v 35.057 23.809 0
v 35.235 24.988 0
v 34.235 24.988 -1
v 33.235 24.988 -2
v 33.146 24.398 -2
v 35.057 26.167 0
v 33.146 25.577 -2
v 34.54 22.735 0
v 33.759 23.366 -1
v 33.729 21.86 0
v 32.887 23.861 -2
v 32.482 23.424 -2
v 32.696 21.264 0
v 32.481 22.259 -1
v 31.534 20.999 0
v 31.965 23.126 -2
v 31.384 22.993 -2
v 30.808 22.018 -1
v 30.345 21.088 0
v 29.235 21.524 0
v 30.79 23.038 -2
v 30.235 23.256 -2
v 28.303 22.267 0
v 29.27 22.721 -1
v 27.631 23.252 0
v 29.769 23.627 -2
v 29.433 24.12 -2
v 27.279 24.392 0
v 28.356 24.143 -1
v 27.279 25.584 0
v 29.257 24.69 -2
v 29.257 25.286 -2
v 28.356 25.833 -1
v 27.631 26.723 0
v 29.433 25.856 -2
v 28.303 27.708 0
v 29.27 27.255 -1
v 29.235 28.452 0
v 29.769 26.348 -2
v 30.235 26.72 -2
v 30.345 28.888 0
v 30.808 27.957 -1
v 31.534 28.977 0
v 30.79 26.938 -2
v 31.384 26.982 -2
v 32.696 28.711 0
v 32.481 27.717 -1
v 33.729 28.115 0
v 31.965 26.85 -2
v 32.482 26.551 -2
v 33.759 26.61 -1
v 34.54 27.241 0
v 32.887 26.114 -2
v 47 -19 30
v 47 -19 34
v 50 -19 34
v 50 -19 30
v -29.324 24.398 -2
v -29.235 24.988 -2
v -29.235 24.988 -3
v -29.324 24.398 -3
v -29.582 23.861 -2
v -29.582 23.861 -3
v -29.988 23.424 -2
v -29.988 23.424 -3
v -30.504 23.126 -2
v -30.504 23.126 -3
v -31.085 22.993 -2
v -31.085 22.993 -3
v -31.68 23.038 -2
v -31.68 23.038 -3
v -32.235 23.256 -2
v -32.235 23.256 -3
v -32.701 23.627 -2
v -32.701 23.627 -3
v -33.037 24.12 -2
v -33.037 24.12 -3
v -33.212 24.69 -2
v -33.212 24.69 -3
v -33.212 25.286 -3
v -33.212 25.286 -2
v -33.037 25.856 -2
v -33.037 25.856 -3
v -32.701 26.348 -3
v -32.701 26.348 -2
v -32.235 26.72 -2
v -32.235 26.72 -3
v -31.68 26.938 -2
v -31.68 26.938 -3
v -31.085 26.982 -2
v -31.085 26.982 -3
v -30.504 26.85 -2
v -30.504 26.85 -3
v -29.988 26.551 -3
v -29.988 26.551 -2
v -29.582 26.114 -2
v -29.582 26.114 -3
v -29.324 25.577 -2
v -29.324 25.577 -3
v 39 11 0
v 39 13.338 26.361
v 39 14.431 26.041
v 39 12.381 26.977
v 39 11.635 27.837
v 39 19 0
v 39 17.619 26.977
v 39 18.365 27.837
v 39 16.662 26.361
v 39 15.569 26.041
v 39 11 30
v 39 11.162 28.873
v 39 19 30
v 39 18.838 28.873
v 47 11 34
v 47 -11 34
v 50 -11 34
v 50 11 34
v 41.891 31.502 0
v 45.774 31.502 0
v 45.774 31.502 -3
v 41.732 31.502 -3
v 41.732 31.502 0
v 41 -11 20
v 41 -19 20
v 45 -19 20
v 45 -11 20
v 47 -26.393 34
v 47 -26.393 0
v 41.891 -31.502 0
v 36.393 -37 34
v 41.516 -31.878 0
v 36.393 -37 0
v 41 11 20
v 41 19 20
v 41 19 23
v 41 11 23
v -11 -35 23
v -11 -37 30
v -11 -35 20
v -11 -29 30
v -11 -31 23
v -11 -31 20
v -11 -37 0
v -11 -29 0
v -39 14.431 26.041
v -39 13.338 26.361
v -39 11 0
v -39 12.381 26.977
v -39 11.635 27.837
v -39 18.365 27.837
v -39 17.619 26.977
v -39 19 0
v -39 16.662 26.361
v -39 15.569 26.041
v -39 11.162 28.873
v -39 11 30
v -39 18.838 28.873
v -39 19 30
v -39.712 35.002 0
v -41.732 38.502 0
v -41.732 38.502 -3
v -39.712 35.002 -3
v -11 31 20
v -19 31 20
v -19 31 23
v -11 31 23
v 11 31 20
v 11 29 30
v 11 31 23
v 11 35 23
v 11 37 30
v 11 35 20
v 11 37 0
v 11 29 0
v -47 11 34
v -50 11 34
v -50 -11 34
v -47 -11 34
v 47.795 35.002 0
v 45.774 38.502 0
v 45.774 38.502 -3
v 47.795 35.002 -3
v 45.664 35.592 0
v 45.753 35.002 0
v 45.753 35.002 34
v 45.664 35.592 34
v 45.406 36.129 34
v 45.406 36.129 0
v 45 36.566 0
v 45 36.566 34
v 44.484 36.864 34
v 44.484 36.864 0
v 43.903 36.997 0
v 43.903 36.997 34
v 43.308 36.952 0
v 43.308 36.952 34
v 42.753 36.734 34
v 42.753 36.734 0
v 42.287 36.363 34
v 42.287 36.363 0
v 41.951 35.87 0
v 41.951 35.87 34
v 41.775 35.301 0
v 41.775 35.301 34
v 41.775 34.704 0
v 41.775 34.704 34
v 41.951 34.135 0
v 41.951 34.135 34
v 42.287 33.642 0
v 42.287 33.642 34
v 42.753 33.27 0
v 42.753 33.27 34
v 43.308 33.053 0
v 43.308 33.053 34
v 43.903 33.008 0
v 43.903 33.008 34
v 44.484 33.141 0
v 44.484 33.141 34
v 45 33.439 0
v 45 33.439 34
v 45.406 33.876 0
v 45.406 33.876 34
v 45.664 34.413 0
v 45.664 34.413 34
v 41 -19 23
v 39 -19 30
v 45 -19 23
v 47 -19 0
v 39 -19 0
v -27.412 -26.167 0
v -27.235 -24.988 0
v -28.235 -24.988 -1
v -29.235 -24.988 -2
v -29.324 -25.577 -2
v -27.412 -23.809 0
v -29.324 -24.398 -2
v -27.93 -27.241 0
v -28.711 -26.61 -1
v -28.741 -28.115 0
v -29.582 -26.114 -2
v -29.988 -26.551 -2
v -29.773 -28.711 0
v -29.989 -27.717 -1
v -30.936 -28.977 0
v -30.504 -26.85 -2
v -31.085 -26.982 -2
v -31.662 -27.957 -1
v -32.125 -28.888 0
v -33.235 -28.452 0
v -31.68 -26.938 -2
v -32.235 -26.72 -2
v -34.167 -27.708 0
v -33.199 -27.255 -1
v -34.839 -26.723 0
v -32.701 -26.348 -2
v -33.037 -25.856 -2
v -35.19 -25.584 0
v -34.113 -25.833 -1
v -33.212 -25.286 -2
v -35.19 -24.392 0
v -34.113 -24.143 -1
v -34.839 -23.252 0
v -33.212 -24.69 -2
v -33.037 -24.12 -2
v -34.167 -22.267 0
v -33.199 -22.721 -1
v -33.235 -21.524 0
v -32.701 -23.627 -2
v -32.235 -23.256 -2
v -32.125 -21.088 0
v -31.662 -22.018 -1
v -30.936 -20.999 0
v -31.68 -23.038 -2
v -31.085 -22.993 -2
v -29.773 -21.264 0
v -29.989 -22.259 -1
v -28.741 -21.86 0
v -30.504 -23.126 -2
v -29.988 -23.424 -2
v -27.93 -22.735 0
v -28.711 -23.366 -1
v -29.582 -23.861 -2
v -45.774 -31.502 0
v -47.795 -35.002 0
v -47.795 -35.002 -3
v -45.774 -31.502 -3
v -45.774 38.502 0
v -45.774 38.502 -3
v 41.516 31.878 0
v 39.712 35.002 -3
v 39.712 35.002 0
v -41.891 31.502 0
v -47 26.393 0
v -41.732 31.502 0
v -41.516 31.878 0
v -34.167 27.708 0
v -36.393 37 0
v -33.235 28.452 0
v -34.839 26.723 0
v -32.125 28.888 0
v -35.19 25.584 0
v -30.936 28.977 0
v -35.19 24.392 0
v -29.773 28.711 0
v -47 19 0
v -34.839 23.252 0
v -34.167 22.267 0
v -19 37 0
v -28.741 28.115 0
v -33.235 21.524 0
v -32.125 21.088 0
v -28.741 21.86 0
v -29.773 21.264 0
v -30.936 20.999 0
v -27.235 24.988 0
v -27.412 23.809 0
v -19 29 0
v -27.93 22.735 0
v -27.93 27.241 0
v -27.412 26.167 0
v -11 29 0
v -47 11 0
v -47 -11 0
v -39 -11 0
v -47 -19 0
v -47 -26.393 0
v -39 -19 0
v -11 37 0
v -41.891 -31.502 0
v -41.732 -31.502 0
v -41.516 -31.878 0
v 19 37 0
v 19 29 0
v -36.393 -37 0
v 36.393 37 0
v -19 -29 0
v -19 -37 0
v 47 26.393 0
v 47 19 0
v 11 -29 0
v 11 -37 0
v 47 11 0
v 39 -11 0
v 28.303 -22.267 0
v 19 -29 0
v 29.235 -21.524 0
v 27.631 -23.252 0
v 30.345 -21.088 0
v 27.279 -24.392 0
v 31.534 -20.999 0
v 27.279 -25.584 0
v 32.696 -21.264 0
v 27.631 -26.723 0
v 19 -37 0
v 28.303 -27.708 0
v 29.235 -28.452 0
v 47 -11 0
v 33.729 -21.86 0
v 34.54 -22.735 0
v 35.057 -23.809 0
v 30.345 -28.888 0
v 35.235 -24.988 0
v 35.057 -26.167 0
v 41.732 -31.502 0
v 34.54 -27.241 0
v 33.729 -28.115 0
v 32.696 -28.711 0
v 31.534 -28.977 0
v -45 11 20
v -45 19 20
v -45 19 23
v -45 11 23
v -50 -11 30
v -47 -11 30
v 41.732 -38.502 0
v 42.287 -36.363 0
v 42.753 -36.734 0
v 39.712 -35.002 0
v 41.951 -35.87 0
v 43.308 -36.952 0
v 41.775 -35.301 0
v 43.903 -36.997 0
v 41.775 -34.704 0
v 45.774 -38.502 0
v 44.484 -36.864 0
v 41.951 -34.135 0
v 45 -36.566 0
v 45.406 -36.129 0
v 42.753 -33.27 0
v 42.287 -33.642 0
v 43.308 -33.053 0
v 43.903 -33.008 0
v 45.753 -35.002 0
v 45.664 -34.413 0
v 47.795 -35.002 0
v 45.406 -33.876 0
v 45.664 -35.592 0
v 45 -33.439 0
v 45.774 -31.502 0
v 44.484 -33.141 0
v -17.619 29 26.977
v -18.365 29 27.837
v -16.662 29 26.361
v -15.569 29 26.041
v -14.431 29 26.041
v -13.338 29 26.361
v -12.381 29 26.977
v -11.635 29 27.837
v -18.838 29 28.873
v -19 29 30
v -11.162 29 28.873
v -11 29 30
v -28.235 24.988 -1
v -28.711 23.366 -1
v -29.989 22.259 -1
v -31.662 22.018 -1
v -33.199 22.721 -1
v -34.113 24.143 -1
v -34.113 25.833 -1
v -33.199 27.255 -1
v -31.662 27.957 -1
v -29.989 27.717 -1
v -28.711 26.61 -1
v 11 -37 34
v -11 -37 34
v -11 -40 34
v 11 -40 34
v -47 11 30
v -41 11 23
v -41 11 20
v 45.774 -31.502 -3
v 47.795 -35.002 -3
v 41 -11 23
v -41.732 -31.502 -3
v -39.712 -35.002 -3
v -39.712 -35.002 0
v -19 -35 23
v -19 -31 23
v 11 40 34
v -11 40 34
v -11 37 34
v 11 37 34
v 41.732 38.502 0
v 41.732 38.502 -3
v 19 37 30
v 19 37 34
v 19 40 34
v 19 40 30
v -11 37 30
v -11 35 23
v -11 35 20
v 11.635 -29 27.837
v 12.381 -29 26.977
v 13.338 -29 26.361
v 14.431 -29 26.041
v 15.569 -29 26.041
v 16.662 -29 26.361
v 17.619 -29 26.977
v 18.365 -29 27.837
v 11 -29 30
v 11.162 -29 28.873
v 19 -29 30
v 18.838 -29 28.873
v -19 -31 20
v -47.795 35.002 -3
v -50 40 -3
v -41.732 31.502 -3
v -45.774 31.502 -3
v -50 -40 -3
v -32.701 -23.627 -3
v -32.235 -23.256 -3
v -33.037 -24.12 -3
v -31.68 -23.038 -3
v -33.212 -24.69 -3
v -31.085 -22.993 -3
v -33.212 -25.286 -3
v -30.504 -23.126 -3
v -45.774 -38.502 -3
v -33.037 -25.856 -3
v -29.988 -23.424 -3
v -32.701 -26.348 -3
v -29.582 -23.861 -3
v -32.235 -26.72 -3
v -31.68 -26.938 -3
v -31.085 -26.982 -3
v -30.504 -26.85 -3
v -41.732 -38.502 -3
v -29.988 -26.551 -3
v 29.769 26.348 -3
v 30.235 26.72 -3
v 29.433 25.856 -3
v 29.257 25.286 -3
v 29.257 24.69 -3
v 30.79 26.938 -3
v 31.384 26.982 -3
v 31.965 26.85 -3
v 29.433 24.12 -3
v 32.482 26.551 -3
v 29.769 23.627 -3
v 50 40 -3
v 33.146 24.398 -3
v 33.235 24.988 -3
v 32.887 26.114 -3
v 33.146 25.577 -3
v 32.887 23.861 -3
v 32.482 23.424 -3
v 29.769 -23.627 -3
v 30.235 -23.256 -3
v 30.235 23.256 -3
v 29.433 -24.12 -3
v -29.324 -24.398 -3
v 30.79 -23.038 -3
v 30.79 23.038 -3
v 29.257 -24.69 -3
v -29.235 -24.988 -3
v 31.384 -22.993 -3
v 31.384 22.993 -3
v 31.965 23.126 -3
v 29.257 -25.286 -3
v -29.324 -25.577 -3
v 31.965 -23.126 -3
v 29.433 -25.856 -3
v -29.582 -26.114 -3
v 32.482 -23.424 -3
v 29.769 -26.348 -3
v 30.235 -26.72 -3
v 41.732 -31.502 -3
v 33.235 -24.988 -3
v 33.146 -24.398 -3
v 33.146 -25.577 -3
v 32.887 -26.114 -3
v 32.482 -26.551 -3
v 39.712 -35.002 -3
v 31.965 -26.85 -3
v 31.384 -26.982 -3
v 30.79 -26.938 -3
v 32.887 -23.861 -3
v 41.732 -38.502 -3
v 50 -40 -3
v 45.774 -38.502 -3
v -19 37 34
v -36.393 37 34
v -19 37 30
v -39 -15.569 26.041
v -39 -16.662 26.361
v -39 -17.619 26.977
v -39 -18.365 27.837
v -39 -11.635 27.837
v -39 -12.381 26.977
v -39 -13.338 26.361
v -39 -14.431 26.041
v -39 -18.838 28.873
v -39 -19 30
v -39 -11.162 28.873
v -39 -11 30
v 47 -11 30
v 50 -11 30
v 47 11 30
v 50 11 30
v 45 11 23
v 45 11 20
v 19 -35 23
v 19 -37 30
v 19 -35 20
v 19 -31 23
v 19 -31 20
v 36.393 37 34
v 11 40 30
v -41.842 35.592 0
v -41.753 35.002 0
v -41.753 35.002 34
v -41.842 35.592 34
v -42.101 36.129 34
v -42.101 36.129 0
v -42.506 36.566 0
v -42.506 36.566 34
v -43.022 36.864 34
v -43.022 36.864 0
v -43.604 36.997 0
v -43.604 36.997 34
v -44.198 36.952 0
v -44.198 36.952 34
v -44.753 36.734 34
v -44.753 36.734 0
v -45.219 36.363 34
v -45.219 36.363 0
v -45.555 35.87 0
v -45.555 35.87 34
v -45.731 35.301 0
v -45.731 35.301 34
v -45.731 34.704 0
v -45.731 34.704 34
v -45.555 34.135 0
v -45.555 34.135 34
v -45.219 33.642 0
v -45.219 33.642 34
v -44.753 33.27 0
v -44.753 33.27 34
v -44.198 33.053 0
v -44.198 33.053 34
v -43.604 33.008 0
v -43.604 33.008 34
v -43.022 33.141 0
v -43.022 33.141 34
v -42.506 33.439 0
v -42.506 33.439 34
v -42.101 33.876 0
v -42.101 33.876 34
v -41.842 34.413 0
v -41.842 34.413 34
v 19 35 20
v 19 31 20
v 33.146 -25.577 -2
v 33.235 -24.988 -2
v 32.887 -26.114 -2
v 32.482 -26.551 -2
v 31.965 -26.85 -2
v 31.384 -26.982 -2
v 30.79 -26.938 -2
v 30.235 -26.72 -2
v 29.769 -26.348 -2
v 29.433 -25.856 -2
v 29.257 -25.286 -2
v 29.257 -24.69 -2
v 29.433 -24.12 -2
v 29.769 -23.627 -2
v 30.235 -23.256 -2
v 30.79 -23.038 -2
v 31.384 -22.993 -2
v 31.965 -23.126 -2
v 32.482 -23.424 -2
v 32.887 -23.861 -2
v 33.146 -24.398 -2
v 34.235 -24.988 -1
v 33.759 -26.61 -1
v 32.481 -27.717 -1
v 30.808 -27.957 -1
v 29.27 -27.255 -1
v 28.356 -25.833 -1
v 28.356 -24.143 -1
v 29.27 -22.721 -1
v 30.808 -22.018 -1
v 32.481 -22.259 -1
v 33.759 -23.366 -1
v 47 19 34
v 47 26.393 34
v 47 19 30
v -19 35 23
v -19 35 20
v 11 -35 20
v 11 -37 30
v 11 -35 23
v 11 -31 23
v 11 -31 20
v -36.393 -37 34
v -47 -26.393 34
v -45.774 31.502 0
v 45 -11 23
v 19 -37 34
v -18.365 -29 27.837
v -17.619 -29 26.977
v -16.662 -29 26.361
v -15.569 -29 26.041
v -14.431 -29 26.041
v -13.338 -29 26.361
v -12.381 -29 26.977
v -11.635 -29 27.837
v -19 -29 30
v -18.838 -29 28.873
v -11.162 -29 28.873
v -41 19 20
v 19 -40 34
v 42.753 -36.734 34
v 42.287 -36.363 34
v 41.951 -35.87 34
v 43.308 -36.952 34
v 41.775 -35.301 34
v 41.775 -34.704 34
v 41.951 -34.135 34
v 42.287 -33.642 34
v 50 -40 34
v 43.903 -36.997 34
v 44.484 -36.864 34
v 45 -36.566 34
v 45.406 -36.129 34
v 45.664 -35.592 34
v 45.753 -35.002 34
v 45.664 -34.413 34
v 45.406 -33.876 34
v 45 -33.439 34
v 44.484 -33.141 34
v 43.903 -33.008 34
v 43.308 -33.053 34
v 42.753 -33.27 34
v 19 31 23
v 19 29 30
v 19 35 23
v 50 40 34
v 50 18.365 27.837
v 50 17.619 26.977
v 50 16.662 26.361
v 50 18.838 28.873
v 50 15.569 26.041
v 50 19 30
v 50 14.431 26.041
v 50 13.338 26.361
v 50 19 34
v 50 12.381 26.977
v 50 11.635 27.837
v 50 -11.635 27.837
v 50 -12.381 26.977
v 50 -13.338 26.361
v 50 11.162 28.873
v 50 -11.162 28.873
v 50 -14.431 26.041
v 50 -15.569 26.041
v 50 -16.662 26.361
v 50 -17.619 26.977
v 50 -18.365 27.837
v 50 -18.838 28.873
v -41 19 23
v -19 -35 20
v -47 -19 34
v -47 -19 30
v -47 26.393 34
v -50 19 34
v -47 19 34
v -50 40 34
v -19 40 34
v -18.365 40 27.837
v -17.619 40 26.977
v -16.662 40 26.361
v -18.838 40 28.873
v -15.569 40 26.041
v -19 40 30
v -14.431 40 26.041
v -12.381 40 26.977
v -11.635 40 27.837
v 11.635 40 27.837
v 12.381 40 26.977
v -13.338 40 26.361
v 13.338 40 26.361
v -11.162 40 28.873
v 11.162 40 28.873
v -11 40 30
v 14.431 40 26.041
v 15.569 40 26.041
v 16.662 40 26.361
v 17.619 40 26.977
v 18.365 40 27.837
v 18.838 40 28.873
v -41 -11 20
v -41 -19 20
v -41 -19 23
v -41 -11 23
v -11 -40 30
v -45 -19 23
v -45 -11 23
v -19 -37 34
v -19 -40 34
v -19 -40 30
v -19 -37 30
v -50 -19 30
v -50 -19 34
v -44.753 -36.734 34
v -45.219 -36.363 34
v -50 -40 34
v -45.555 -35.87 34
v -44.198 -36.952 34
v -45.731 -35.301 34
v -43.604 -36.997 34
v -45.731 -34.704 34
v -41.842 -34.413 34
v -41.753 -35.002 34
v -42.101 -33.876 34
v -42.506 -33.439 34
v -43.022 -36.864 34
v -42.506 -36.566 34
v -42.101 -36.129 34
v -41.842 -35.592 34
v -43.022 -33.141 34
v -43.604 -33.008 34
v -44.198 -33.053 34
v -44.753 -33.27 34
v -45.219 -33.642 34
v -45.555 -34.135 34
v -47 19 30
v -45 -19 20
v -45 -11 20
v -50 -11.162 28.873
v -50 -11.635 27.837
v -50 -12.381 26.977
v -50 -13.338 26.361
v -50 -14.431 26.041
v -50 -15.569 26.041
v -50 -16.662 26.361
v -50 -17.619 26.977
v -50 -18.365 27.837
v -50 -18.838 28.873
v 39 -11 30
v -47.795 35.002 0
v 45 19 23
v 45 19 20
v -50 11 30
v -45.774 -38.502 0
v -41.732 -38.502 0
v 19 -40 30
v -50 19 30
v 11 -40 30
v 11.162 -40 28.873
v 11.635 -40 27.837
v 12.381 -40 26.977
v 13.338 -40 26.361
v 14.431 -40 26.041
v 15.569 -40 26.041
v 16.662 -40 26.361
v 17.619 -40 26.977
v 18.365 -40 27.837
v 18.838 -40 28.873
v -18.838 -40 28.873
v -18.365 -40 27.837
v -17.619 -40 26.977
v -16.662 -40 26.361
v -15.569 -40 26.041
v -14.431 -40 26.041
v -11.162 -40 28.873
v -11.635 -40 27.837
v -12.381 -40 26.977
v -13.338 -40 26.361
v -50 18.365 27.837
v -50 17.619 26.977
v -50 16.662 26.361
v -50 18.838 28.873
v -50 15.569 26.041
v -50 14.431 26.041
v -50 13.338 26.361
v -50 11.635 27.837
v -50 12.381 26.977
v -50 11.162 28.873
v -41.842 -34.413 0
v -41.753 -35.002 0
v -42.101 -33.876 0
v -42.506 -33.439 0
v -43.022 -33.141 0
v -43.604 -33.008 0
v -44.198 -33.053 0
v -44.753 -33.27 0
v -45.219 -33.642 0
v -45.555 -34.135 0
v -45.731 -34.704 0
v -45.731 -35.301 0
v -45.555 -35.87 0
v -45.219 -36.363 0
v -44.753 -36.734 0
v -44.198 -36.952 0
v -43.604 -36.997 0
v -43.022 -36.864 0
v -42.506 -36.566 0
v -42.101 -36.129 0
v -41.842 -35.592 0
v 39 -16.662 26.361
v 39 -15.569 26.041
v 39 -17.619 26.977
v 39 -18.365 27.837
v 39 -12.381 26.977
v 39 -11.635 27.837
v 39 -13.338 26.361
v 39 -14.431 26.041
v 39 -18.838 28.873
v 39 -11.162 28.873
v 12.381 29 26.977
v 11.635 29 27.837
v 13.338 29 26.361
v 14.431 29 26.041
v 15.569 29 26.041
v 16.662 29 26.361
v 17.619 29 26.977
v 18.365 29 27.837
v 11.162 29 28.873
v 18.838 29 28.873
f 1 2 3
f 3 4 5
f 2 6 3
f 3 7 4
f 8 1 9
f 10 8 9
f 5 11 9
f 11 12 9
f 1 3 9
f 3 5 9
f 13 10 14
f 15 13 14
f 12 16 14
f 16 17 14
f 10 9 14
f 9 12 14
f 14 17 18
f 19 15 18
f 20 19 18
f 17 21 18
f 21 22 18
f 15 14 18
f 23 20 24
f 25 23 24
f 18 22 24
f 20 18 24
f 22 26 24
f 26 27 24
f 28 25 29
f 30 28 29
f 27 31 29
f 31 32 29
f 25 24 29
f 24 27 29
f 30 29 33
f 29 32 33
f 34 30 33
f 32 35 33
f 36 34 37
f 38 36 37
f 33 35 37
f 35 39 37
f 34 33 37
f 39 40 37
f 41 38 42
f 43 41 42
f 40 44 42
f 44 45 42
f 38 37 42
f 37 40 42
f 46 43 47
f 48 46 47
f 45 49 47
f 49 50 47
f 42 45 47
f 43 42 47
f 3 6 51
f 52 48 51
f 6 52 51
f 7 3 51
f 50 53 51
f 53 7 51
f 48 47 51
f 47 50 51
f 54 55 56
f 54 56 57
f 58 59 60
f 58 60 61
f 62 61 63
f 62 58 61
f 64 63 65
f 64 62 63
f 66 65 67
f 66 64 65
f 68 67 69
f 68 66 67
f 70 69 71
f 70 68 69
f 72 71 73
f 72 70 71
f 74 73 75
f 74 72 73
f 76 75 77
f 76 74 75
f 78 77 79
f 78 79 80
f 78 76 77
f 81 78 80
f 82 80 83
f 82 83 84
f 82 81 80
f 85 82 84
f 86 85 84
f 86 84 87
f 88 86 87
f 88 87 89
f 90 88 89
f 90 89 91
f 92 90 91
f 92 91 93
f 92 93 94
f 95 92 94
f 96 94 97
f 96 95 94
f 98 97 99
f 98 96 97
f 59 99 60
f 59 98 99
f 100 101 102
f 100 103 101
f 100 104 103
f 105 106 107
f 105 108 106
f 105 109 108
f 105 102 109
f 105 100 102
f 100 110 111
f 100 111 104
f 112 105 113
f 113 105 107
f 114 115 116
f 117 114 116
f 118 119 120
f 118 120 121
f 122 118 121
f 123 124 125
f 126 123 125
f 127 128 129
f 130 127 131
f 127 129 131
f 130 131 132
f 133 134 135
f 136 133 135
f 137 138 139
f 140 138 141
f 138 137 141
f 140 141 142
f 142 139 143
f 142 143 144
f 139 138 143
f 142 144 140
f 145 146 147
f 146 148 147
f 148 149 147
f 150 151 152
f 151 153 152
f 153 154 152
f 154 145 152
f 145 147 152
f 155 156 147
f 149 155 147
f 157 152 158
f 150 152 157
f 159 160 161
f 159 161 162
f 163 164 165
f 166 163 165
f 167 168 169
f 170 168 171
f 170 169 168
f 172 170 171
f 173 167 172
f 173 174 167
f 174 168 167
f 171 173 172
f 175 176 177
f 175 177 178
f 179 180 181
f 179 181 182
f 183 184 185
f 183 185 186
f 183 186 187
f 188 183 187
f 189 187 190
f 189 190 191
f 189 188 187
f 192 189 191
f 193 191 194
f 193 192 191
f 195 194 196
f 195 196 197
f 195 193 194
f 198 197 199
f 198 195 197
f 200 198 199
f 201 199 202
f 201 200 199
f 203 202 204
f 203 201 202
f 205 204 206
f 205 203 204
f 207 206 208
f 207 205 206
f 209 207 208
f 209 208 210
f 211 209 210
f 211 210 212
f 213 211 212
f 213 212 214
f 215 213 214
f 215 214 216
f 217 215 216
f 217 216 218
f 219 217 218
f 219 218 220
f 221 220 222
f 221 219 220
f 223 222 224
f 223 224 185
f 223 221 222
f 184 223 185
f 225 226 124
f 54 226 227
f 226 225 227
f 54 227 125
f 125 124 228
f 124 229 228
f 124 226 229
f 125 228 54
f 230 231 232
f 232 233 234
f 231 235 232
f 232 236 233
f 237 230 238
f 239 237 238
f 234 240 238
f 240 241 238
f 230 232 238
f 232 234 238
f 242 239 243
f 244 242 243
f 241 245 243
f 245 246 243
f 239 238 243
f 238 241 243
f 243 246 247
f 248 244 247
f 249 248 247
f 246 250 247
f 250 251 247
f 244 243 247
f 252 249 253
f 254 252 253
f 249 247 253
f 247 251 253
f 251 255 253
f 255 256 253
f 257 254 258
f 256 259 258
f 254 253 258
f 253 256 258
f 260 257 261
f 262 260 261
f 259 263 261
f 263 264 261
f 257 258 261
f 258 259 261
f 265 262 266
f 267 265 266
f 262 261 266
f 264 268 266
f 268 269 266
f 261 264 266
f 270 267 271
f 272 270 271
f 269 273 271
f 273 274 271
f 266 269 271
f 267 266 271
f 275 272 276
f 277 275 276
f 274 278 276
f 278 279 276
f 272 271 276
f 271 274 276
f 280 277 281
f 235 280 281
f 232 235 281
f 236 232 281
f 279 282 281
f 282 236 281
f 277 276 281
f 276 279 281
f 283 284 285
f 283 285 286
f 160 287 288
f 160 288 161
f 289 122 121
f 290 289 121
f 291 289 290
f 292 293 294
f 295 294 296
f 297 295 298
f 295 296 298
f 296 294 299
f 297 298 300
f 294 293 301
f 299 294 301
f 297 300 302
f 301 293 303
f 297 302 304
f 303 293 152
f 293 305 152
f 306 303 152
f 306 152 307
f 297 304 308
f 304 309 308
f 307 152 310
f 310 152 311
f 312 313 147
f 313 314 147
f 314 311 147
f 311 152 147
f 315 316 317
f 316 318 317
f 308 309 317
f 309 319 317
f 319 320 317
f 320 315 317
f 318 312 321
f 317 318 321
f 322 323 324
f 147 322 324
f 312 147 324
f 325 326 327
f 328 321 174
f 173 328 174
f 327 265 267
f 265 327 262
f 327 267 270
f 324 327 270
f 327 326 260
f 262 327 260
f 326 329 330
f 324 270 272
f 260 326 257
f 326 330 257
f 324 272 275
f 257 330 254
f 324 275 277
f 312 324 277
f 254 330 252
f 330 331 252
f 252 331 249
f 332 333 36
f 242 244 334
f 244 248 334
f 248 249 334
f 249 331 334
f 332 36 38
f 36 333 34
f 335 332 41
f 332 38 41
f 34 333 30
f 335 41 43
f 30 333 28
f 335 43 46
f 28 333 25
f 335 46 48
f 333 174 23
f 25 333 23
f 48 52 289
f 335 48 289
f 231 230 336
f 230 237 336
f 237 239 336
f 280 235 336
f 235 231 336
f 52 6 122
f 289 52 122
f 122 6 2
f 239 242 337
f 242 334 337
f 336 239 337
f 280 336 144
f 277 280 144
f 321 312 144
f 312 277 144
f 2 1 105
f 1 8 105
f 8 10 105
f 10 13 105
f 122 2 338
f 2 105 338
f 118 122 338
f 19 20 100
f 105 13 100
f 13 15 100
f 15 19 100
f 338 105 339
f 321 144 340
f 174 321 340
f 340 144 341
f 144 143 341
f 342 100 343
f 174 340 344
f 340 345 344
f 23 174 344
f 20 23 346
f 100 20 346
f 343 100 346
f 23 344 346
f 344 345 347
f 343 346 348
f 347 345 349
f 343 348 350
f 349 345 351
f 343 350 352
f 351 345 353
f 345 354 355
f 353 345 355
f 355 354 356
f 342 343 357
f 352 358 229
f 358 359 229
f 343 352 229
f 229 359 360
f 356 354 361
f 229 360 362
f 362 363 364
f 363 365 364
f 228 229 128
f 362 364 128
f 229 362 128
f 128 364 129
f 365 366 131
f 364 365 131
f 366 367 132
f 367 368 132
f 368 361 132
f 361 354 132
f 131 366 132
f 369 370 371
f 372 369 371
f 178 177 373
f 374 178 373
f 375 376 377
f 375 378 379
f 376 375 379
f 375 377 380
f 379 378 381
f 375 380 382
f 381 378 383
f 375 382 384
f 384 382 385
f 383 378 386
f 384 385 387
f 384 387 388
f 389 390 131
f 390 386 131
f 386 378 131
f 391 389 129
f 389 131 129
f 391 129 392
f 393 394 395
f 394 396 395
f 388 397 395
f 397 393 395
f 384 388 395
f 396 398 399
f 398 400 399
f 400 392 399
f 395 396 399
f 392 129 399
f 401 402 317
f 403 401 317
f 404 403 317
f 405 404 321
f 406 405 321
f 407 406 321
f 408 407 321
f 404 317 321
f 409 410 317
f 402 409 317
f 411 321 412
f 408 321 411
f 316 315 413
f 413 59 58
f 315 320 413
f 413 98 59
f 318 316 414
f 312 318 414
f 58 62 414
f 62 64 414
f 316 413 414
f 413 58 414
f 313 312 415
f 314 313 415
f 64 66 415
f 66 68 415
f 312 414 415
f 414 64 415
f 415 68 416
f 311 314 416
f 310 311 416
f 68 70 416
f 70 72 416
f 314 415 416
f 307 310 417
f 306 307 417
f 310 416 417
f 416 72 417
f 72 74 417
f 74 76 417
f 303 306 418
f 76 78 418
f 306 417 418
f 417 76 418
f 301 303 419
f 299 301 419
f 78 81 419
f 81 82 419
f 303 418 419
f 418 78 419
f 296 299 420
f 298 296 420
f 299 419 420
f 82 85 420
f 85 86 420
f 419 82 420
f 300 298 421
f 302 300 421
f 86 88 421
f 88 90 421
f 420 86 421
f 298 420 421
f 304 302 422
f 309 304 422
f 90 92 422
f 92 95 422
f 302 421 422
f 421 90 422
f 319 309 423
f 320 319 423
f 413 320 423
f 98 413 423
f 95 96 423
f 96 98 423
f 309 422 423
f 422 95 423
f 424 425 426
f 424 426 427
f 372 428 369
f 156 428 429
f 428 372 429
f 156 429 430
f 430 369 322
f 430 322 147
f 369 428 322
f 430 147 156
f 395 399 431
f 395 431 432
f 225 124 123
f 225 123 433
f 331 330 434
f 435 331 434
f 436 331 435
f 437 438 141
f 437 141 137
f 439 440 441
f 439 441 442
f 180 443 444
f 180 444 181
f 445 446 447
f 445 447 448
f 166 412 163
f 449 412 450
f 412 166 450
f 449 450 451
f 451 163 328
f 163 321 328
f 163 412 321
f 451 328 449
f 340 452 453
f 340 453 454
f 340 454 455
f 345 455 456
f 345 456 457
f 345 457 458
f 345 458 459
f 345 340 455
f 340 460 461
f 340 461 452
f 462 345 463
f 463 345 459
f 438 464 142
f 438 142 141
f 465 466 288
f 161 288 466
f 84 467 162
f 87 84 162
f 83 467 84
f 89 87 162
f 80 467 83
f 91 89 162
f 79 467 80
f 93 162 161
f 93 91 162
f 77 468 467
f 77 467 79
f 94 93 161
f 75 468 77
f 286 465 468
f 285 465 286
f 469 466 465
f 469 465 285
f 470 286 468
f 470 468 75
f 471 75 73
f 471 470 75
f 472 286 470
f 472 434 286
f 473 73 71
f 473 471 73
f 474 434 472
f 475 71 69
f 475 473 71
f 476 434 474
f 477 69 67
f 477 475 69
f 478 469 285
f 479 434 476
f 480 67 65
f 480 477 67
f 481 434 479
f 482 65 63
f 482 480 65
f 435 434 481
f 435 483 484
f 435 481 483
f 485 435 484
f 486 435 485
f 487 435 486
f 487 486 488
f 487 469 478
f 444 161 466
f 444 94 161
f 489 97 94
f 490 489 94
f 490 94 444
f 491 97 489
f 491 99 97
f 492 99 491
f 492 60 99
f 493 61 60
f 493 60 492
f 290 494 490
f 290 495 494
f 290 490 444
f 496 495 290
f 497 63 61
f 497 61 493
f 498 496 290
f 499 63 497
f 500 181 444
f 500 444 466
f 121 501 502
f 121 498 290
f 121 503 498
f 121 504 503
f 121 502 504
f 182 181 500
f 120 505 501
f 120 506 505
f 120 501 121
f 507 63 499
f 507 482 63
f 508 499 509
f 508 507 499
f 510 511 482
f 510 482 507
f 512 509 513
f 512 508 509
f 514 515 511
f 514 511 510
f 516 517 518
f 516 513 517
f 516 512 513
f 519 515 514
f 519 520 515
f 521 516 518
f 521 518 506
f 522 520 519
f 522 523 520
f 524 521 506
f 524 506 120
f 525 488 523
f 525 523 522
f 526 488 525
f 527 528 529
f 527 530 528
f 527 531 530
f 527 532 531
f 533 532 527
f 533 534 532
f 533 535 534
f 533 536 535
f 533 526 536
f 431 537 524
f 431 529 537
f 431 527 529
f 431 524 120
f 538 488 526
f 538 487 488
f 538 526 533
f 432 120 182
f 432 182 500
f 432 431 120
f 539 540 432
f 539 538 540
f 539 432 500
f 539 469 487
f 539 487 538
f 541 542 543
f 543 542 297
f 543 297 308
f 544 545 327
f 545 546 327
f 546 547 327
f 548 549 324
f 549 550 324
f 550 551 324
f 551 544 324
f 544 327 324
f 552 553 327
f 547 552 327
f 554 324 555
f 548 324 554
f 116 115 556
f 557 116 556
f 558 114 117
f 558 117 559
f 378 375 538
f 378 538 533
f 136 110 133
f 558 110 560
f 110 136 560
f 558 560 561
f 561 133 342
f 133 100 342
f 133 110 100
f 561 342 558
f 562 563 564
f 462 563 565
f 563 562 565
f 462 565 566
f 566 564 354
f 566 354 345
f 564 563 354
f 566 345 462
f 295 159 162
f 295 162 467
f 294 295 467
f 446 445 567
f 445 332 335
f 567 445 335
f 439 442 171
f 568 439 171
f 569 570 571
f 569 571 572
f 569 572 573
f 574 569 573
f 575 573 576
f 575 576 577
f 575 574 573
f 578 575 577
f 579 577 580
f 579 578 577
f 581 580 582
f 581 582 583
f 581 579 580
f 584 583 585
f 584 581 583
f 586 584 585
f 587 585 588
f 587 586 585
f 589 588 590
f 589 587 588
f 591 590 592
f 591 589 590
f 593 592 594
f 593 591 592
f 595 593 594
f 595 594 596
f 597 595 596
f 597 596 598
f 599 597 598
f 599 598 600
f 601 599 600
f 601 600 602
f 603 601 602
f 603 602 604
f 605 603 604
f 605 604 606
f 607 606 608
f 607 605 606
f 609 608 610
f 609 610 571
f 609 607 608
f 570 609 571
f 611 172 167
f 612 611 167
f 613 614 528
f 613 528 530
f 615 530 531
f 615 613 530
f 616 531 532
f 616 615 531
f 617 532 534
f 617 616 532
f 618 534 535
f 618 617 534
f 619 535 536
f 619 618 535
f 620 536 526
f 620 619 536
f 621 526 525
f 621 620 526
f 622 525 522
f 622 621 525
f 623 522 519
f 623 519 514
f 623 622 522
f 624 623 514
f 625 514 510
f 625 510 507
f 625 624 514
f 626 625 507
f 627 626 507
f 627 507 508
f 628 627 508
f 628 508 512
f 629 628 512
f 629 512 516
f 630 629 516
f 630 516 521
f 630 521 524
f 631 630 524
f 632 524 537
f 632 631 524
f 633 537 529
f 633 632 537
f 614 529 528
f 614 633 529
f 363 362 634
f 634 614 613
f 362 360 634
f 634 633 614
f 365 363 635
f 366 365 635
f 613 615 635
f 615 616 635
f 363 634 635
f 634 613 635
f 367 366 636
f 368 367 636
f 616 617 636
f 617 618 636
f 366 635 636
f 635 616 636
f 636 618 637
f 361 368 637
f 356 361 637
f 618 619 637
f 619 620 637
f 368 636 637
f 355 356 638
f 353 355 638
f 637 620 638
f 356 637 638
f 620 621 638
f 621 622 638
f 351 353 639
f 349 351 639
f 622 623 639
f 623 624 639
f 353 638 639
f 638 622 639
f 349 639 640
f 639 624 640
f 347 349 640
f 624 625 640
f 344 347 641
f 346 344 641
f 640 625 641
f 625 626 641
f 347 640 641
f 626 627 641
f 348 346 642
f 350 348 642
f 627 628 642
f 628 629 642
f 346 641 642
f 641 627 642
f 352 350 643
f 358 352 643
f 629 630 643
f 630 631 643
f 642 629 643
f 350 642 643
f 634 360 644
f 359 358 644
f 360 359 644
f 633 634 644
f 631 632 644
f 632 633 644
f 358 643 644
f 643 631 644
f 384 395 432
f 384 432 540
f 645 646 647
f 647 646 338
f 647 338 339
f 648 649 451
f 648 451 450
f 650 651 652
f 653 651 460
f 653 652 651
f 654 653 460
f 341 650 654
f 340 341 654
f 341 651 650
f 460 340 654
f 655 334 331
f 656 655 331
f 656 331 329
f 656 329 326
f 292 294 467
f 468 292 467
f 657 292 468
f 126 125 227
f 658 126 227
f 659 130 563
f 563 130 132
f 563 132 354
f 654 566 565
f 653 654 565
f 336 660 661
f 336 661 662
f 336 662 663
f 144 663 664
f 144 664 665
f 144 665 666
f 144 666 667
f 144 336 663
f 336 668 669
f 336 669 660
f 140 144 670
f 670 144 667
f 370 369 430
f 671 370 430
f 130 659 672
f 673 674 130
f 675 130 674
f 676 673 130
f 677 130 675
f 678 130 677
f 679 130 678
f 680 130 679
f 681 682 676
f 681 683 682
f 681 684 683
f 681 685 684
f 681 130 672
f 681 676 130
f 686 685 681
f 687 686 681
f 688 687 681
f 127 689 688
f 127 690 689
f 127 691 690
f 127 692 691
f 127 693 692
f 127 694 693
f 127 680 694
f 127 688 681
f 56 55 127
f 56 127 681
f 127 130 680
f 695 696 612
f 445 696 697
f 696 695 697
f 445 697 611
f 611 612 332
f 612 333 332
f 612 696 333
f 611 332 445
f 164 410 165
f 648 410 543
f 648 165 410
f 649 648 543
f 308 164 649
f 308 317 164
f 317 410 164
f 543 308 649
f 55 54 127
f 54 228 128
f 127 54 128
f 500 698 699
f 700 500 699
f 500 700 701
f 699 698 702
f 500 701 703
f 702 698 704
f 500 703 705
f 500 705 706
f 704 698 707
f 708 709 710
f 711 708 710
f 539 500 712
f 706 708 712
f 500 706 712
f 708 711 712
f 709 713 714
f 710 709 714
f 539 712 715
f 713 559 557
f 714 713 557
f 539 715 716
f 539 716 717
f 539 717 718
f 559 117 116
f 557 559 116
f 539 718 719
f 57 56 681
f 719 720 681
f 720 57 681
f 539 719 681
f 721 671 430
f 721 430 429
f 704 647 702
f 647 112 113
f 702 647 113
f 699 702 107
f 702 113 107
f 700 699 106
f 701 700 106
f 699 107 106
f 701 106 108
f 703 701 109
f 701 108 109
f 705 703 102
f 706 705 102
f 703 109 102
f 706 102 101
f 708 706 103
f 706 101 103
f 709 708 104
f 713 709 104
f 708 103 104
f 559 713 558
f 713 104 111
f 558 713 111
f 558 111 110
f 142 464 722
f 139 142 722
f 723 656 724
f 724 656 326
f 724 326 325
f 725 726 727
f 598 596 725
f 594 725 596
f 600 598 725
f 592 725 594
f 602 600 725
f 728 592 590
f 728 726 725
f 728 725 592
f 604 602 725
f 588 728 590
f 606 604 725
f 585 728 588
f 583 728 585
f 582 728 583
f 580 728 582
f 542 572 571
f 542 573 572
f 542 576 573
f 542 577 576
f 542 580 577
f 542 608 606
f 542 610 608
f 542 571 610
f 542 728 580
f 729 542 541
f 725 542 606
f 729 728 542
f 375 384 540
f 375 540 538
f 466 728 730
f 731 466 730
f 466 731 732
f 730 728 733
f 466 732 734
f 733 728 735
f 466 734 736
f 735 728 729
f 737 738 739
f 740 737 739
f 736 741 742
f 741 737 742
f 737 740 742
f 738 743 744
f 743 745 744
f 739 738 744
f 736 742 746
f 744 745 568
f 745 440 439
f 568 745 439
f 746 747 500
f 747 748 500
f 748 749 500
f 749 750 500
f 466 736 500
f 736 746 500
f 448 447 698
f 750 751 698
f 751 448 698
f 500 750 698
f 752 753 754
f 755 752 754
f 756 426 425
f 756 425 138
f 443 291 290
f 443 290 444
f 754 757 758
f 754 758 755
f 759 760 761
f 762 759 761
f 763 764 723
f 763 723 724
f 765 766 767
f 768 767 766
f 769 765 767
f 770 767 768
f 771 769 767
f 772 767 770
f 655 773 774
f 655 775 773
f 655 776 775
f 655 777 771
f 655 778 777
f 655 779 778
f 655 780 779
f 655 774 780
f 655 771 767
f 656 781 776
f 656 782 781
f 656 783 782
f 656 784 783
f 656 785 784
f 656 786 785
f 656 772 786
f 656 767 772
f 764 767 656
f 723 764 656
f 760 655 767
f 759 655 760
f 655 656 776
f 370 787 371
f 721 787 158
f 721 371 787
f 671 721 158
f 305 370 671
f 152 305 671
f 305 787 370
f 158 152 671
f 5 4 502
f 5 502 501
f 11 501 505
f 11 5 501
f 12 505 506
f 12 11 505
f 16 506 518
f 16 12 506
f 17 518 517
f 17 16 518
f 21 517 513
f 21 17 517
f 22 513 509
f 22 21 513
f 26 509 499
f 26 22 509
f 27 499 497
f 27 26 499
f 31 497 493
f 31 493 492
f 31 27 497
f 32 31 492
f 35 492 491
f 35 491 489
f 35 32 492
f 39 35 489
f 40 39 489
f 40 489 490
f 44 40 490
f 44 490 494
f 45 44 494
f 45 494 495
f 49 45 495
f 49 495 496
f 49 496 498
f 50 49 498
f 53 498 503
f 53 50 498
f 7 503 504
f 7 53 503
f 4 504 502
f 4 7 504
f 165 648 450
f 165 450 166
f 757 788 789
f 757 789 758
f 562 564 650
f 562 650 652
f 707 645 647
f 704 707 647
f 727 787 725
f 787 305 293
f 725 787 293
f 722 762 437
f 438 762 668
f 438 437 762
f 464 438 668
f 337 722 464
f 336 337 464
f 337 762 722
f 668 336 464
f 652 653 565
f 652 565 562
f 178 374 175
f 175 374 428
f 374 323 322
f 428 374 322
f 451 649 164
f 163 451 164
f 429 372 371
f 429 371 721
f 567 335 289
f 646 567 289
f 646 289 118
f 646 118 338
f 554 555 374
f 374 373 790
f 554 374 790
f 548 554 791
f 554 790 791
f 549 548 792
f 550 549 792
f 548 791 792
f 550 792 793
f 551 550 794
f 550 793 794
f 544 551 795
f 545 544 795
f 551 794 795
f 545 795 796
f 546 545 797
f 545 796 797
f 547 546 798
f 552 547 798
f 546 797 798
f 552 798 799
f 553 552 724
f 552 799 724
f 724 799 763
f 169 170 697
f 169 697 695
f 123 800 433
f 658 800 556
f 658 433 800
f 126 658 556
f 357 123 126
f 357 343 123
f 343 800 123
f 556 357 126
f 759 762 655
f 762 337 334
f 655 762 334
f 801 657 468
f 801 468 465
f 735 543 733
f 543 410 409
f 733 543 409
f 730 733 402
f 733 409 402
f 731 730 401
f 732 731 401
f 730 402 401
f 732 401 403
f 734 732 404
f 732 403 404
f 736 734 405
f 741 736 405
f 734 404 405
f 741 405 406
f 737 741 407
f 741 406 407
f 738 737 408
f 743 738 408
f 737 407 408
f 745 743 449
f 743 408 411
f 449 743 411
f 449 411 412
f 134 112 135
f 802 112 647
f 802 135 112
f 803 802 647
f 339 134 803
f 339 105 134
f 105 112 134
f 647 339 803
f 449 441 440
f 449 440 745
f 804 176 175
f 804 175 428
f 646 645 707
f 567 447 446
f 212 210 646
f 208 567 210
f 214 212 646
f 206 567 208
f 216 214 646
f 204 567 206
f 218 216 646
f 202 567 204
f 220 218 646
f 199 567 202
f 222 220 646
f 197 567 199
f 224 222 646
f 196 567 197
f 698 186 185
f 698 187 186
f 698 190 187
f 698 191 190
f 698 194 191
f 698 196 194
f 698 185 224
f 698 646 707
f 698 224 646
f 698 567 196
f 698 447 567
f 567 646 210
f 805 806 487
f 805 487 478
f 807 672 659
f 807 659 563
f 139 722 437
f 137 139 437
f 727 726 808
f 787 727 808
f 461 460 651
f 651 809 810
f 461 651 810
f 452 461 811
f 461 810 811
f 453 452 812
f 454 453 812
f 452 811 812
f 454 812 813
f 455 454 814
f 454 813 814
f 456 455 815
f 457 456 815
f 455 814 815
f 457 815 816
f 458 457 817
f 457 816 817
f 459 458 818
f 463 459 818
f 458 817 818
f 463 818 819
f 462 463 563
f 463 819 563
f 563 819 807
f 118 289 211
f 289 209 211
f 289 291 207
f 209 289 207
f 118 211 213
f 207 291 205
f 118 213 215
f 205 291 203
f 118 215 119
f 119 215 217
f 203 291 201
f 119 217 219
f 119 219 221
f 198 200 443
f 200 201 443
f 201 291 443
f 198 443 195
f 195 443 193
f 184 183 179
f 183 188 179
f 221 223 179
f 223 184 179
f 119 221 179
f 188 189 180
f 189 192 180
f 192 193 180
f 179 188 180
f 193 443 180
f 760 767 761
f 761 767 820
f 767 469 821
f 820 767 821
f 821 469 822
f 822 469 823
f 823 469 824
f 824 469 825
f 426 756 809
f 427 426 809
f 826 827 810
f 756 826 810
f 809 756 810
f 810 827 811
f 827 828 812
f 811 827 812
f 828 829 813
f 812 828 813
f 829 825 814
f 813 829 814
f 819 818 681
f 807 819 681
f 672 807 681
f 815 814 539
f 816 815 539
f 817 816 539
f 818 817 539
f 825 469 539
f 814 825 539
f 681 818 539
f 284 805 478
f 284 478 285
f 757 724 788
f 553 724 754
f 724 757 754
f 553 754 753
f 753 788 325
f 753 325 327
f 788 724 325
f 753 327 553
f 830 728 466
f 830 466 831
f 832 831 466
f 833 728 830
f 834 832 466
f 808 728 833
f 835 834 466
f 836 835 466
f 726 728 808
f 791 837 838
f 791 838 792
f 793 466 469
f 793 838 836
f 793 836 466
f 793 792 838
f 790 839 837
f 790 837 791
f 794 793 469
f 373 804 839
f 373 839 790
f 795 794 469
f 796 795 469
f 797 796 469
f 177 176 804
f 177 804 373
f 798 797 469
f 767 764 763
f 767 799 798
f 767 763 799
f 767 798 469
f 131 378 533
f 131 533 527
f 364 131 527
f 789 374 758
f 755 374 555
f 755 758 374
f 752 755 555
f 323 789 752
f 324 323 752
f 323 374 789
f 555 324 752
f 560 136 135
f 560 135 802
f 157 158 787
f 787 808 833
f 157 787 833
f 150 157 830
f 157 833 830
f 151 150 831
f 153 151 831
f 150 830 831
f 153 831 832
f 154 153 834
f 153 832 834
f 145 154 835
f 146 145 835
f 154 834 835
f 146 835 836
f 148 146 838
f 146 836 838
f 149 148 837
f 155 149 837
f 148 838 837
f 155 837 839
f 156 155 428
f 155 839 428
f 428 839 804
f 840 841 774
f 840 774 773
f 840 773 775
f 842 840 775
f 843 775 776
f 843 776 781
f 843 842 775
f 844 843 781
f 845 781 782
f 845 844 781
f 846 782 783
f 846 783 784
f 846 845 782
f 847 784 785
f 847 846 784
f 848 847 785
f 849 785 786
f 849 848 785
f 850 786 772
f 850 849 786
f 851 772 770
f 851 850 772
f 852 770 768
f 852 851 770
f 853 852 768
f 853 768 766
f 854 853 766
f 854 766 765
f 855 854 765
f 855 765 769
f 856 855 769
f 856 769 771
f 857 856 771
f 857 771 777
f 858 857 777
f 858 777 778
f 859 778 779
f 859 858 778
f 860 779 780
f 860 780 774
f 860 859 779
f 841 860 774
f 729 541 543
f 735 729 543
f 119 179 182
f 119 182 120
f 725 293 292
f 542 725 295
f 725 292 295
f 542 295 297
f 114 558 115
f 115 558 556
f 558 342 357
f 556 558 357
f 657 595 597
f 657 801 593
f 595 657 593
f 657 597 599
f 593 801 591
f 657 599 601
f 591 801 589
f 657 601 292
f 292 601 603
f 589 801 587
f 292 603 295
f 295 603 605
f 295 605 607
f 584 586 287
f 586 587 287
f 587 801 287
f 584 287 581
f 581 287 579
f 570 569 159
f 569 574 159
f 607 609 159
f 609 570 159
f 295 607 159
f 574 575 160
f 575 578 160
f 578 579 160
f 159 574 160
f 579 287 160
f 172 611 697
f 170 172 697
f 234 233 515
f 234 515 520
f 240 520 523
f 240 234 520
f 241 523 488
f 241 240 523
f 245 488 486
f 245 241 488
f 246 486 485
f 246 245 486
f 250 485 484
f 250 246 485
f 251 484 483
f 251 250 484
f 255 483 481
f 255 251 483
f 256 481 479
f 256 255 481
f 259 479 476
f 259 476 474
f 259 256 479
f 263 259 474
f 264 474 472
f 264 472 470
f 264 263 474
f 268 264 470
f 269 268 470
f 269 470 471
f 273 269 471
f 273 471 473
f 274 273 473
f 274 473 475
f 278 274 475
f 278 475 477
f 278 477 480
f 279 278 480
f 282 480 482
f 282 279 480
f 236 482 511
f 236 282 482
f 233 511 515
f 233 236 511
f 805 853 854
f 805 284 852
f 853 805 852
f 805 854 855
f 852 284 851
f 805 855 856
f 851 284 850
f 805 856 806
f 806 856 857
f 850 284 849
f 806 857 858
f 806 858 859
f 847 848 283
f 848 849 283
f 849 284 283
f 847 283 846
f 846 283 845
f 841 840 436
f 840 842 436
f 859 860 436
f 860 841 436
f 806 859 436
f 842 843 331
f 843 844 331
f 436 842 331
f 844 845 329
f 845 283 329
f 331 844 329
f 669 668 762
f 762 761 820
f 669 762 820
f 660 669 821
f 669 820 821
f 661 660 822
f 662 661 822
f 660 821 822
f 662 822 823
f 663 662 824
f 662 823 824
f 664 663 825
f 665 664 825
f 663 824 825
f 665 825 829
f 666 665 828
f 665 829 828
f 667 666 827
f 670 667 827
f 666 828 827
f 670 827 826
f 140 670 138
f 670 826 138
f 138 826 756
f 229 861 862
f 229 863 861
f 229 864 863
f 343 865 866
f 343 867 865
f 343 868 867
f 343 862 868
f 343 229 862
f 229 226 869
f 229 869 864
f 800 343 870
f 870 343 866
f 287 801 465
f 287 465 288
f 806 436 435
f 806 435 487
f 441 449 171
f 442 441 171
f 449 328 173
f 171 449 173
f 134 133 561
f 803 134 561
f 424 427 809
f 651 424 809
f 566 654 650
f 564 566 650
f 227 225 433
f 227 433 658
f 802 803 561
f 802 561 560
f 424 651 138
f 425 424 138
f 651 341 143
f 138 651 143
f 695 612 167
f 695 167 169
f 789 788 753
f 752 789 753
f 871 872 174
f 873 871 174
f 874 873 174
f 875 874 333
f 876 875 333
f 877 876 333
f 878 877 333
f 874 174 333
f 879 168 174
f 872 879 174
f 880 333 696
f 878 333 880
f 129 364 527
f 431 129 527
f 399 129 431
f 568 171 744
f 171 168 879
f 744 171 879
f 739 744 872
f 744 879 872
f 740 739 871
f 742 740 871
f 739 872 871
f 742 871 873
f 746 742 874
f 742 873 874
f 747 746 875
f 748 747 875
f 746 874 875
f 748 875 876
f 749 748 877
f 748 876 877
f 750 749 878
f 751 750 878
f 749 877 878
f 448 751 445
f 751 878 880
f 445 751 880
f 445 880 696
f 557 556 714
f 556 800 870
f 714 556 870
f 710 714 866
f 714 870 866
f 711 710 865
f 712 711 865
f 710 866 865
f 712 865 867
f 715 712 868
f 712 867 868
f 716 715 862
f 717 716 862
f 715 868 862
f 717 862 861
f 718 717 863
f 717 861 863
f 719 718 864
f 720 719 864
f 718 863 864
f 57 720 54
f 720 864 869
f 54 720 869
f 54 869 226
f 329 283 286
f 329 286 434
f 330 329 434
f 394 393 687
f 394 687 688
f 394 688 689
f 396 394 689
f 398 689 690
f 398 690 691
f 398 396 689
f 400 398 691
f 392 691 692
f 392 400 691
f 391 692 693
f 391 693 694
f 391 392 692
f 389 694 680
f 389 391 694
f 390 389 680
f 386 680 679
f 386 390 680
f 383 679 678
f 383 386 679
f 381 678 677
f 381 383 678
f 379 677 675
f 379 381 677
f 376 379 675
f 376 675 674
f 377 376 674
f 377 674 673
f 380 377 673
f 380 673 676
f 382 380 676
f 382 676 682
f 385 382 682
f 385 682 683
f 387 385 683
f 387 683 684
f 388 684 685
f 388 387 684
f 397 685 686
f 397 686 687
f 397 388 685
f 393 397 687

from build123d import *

# Parameters (mm, degrees)
SKETCH_W        = 100
SKETCH_H        = 80
SKETCH_R        = 2
PAD_DEPTH       = 34
SKETCH001_W     = 100
SKETCH001_H     = 80
SKETCH001_R     = 2
PAD001_DEPTH    = 3
CHAMFER_SIZE    = 2
CHAMFER001_SIZE = 2
CHAMFER002_SIZE = 2
CHAMFER003_SIZE = 2
SKETCH004_W     = 8
SKETCH004_H     = 11
SKETCH004_W_2   = 11
SKETCH004_H_2   = 8
PAD002_DEPTH    = 30
POCKET_DEPTH    = 80.001
POCKET001_DEPTH = 100.001
SKETCH005_W     = 4
SKETCH005_H     = 3
POCKET002_DEPTH = 46
SKETCH006_W     = 4
SKETCH006_H     = 3
POCKET003_DEPTH = 45


with BuildPart() as part:
    # Sketch → Pad (new body)
    with BuildSketch(Plane.XY):
        Rectangle(SKETCH_W, SKETCH_H)
        with Locations((-43.75305, -35.00244)):
            Circle(SKETCH_R, mode=Mode.SUBTRACT)
        with Locations((43.75305, 35.00244)):
            Circle(SKETCH_R, mode=Mode.SUBTRACT)
        with Locations((-43.75305, 35.00244)):
            Circle(SKETCH_R, mode=Mode.SUBTRACT)
        with Locations((43.75305, -35.00244)):
            Circle(SKETCH_R, mode=Mode.SUBTRACT)
        Polygon((-47, -26.393398), (-47, 26.393398), (-36.393398, 37), (36.393398, 37), (47, 26.393398), (47, -26.393398), (36.393398, -37), (-36.393398, -37), align=None, mode=Mode.SUBTRACT)
    extrude(amount=PAD_DEPTH)

    # Sketch001 (on Face17 of Pad) → Pad001 (join)
    with BuildSketch(Plane(origin=(0, 0, 0), x_dir=(1, 0, 0), z_dir=(0, 0, -1))):
        Rectangle(SKETCH001_W, SKETCH001_H)
        with Locations((-31.234752, -24.987802)):
            Circle(SKETCH001_R, mode=Mode.SUBTRACT)
        with Locations((31.234752, 24.987802)):
            Circle(SKETCH001_R, mode=Mode.SUBTRACT)
        with Locations((-31.234752, 24.987802)):
            Circle(SKETCH001_R, mode=Mode.SUBTRACT)
        with Locations((31.234752, -24.987802)):
            Circle(SKETCH001_R, mode=Mode.SUBTRACT)
        Polygon((-39.711598, -35.00244), (-41.732324, -31.50244), (-45.773775, -31.50244), (-47.794501, -35.00244), (-45.773775, -38.50244), (-41.732324, -38.50244), align=None, mode=Mode.SUBTRACT)
        Polygon((47.794501, 35.00244), (45.773775, 38.50244), (41.732324, 38.50244), (39.711598, 35.00244), (41.732324, 31.50244), (45.773775, 31.50244), align=None, mode=Mode.SUBTRACT)
        Polygon((-39.711598, 35.00244), (-41.732324, 38.50244), (-45.773775, 38.50244), (-47.794501, 35.00244), (-45.773775, 31.50244), (-41.732324, 31.50244), align=None, mode=Mode.SUBTRACT)
        Polygon((47.794501, -35.00244), (45.773775, -31.50244), (41.732324, -31.50244), (39.711598, -35.00244), (41.732324, -38.50244), (45.773775, -38.50244), align=None, mode=Mode.SUBTRACT)
    extrude(amount=PAD001_DEPTH)

    # Chamfer
    chamfer_edges = [part.edges().sort_by_distance(p)[0] for p in [
        (-33.234752, -24.987802, 0),
    ]]
    chamfer(chamfer_edges, length=CHAMFER_SIZE)

    # Chamfer001
    chamfer001_edges = [part.edges().sort_by_distance(p)[0] for p in [
        (-33.234752, 24.987802, 0),
    ]]
    chamfer(chamfer001_edges, length=CHAMFER001_SIZE)

    # Chamfer002
    chamfer002_edges = [part.edges().sort_by_distance(p)[0] for p in [
        (29.234752, 24.987802, 0),
    ]]
    chamfer(chamfer002_edges, length=CHAMFER002_SIZE)

    # Chamfer003
    chamfer003_edges = [part.edges().sort_by_distance(p)[0] for p in [
        (29.234752, -24.987802, 0),
    ]]
    chamfer(chamfer003_edges, length=CHAMFER003_SIZE)

    # Sketch004 (on Face1 of Chamfer003) → Pad002 (join)
    with BuildSketch(Plane.XY):
        with Locations((-15, -34.5)):
            Rectangle(SKETCH004_W, SKETCH004_H)
        with Locations((15, 34.5)):
            Rectangle(SKETCH004_W, SKETCH004_H)
        with Locations((15, -34.5)):
            Rectangle(SKETCH004_W, SKETCH004_H)
        with Locations((-15, 34.5)):
            Rectangle(SKETCH004_W, SKETCH004_H)
        with Locations((-44.5, 15)):
            Rectangle(SKETCH004_W_2, SKETCH004_H_2)
        with Locations((44.5, 15)):
            Rectangle(SKETCH004_W_2, SKETCH004_H_2)
        with Locations((44.5, -15)):
            Rectangle(SKETCH004_W_2, SKETCH004_H_2)
        with Locations((-44.5, -15)):
            Rectangle(SKETCH004_W_2, SKETCH004_H_2)
    extrude(amount=PAD002_DEPTH)

    # Sketch002 (on Face85 of Pad002) → Pocket (cut, through all)
    with BuildSketch(Plane.XZ.offset(40)):
        with BuildLine():
            Line((-19, 34), (-19, 30))
            ThreePointArc((-19, 30), (-15, 26), (-11, 30))
            Line((-11, 34), (-11, 30))
            Line((-11, 34), (-19, 34))
        make_face()
        with BuildLine():
            Line((19, 34), (19, 30))
            ThreePointArc((11, 30), (15, 26), (19, 30))
            Line((11, 34), (11, 30))
            Line((11, 34), (19, 34))
        make_face()
    extrude(amount=-POCKET_DEPTH, mode=Mode.SUBTRACT)

    # Sketch003 (on Face108 of Pocket) → Pocket001 (cut, through all)
    with BuildSketch(Plane(origin=(-50, 0, 0), x_dir=(0, -1, 0), z_dir=(-1, 0, 0))):
        with BuildLine():
            Line((-19, 34), (-19, 30))
            ThreePointArc((-19, 30), (-15, 26), (-11, 30))
            Line((-11, 34), (-11, 30))
            Line((-11, 34), (-19, 34))
        make_face()
        with BuildLine():
            Line((19, 34), (19, 30))
            ThreePointArc((11, 30), (15, 26), (19, 30))
            Line((11, 34), (11, 30))
            Line((11, 34), (19, 34))
        make_face()
    extrude(amount=-POCKET001_DEPTH, mode=Mode.SUBTRACT)

    # Sketch005 (on Face24 of Pocket001) → Pocket002 (cut)
    with BuildSketch(Plane.XZ.offset(19)):
        with Locations((-43, 21.5)):
            Rectangle(SKETCH005_W, SKETCH005_H)
        with Locations((43, 21.5)):
            Rectangle(SKETCH005_W, SKETCH005_H)
    extrude(amount=-POCKET002_DEPTH, mode=Mode.SUBTRACT)

    # Sketch006 (on Face12 of Pocket002) → Pocket003 (cut)
    with BuildSketch(Plane(origin=(-19, 0, 0), x_dir=(0, -1, 0), z_dir=(-1, 0, 0))):
        with Locations((-33, 21.5)):
            Rectangle(SKETCH006_W, SKETCH006_H)
        with Locations((33, 21.5)):
            Rectangle(SKETCH006_W, SKETCH006_H)
    extrude(amount=-POCKET003_DEPTH, mode=Mode.SUBTRACT)


solid = part.part
